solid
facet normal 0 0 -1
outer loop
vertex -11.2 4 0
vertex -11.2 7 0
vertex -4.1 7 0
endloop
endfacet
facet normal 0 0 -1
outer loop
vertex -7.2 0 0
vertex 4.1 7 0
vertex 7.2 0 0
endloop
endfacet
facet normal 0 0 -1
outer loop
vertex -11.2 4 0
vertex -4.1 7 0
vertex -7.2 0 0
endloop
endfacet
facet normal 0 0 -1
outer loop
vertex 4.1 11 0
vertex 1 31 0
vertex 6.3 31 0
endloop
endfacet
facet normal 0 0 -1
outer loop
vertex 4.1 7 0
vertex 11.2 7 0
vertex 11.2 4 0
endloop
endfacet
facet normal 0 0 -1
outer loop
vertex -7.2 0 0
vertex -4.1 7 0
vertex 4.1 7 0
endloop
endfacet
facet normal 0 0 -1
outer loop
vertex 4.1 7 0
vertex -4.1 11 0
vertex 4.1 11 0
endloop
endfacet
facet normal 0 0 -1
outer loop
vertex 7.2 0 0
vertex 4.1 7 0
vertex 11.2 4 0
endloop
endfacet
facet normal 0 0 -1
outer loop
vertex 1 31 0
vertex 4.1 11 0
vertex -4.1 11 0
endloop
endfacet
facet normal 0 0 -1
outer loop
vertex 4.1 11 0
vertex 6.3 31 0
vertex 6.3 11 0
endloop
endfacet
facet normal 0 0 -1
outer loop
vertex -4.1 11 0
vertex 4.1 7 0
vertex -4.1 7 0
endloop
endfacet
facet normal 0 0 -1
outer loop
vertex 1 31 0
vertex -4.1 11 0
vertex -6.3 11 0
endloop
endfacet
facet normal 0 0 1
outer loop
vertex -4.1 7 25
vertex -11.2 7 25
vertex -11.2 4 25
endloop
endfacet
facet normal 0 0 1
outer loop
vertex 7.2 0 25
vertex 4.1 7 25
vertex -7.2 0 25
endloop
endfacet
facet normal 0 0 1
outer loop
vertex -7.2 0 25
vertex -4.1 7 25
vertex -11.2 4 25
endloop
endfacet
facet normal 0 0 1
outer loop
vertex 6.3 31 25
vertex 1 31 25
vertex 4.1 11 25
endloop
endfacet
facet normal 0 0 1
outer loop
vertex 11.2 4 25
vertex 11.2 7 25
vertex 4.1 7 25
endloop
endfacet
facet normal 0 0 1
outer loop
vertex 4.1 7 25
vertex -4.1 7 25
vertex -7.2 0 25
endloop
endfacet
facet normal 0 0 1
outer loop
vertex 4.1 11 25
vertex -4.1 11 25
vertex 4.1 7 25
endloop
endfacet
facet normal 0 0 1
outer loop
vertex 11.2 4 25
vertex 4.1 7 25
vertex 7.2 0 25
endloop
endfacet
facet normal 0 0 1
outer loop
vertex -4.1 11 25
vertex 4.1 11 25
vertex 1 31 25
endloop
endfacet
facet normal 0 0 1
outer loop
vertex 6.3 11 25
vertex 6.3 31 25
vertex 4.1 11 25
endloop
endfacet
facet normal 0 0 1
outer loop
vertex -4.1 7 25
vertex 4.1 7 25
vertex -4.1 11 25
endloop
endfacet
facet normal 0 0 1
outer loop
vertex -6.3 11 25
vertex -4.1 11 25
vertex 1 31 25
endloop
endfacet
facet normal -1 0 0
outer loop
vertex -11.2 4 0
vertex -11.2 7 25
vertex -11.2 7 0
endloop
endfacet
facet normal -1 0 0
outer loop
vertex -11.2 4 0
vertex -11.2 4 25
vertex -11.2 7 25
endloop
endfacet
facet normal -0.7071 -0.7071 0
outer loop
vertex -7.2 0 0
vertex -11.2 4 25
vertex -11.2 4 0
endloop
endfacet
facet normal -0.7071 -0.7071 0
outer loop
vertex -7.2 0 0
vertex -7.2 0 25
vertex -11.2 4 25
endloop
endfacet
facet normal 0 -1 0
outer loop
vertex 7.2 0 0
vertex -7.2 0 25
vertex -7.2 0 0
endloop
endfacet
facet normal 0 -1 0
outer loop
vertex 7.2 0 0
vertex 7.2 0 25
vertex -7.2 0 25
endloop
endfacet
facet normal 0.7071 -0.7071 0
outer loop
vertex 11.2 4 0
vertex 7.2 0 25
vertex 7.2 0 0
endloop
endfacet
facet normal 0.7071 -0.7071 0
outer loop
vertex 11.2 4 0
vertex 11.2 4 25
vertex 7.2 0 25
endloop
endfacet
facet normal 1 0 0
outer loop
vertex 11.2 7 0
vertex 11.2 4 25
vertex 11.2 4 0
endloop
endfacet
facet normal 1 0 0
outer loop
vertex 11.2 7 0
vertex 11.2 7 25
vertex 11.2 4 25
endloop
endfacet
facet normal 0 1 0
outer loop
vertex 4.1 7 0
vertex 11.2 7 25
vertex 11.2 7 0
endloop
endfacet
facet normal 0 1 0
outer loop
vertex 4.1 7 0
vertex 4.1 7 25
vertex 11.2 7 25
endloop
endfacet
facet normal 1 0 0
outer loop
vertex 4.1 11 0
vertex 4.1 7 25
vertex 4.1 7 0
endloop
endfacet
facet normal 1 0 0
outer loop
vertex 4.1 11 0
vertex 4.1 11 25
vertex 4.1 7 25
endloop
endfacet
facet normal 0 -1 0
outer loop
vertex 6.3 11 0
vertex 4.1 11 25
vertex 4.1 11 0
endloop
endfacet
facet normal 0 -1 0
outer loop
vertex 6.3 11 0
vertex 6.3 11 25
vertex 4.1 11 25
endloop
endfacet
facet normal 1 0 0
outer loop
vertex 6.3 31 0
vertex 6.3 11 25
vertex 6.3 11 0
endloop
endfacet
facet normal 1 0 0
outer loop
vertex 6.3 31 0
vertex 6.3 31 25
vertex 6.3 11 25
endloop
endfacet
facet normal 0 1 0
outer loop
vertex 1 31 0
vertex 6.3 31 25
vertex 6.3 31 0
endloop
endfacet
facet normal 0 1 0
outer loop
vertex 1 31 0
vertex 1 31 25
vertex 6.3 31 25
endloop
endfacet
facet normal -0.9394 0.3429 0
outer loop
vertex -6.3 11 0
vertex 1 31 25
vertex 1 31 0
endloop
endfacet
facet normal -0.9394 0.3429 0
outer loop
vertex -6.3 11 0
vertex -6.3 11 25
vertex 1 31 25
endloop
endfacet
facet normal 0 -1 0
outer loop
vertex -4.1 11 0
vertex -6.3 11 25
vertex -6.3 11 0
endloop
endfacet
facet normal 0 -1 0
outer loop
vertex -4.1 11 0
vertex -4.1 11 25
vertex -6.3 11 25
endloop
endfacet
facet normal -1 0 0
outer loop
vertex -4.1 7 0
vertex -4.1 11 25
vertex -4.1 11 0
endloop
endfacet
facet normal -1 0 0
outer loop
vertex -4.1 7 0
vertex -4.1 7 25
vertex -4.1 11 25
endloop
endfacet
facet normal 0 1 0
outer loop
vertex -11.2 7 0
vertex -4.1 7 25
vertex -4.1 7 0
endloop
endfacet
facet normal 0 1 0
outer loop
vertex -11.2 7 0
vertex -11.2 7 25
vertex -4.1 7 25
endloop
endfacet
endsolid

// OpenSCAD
// from bottom
hw1 = 7.2;
hw2 = 11.2;
hw3 = 4.1;
hw4 = 6.3;

h1 = 4;
h2 = 3.0;
h3 = 4.0;
h4 = 20;

linear_extrude(height = 25)
polygon(
[
  [-hw1, 0], [hw1, 0],
  [-hw2, h1], [hw2, h1],
  [-hw2, h1 + h2], [hw2, h1 + h2],

  [-hw3, h1 + h2], [hw3, h1 + h2],
  [-hw3, h1 + h2 + h3], [hw3, h1 + h2 + h3],

  [-hw4, h1 + h2 + h3], [hw4, h1 + h2 + h3],  
  [1   , h1 + h2 + h3 + h4], [hw4, h1 + h2 + h3 + h4],
],
[
  [0, 1, 3, 5, 4, 2],  
  [6, 7, 9, 8],
  [10, 11, 13, 12],
]
);
